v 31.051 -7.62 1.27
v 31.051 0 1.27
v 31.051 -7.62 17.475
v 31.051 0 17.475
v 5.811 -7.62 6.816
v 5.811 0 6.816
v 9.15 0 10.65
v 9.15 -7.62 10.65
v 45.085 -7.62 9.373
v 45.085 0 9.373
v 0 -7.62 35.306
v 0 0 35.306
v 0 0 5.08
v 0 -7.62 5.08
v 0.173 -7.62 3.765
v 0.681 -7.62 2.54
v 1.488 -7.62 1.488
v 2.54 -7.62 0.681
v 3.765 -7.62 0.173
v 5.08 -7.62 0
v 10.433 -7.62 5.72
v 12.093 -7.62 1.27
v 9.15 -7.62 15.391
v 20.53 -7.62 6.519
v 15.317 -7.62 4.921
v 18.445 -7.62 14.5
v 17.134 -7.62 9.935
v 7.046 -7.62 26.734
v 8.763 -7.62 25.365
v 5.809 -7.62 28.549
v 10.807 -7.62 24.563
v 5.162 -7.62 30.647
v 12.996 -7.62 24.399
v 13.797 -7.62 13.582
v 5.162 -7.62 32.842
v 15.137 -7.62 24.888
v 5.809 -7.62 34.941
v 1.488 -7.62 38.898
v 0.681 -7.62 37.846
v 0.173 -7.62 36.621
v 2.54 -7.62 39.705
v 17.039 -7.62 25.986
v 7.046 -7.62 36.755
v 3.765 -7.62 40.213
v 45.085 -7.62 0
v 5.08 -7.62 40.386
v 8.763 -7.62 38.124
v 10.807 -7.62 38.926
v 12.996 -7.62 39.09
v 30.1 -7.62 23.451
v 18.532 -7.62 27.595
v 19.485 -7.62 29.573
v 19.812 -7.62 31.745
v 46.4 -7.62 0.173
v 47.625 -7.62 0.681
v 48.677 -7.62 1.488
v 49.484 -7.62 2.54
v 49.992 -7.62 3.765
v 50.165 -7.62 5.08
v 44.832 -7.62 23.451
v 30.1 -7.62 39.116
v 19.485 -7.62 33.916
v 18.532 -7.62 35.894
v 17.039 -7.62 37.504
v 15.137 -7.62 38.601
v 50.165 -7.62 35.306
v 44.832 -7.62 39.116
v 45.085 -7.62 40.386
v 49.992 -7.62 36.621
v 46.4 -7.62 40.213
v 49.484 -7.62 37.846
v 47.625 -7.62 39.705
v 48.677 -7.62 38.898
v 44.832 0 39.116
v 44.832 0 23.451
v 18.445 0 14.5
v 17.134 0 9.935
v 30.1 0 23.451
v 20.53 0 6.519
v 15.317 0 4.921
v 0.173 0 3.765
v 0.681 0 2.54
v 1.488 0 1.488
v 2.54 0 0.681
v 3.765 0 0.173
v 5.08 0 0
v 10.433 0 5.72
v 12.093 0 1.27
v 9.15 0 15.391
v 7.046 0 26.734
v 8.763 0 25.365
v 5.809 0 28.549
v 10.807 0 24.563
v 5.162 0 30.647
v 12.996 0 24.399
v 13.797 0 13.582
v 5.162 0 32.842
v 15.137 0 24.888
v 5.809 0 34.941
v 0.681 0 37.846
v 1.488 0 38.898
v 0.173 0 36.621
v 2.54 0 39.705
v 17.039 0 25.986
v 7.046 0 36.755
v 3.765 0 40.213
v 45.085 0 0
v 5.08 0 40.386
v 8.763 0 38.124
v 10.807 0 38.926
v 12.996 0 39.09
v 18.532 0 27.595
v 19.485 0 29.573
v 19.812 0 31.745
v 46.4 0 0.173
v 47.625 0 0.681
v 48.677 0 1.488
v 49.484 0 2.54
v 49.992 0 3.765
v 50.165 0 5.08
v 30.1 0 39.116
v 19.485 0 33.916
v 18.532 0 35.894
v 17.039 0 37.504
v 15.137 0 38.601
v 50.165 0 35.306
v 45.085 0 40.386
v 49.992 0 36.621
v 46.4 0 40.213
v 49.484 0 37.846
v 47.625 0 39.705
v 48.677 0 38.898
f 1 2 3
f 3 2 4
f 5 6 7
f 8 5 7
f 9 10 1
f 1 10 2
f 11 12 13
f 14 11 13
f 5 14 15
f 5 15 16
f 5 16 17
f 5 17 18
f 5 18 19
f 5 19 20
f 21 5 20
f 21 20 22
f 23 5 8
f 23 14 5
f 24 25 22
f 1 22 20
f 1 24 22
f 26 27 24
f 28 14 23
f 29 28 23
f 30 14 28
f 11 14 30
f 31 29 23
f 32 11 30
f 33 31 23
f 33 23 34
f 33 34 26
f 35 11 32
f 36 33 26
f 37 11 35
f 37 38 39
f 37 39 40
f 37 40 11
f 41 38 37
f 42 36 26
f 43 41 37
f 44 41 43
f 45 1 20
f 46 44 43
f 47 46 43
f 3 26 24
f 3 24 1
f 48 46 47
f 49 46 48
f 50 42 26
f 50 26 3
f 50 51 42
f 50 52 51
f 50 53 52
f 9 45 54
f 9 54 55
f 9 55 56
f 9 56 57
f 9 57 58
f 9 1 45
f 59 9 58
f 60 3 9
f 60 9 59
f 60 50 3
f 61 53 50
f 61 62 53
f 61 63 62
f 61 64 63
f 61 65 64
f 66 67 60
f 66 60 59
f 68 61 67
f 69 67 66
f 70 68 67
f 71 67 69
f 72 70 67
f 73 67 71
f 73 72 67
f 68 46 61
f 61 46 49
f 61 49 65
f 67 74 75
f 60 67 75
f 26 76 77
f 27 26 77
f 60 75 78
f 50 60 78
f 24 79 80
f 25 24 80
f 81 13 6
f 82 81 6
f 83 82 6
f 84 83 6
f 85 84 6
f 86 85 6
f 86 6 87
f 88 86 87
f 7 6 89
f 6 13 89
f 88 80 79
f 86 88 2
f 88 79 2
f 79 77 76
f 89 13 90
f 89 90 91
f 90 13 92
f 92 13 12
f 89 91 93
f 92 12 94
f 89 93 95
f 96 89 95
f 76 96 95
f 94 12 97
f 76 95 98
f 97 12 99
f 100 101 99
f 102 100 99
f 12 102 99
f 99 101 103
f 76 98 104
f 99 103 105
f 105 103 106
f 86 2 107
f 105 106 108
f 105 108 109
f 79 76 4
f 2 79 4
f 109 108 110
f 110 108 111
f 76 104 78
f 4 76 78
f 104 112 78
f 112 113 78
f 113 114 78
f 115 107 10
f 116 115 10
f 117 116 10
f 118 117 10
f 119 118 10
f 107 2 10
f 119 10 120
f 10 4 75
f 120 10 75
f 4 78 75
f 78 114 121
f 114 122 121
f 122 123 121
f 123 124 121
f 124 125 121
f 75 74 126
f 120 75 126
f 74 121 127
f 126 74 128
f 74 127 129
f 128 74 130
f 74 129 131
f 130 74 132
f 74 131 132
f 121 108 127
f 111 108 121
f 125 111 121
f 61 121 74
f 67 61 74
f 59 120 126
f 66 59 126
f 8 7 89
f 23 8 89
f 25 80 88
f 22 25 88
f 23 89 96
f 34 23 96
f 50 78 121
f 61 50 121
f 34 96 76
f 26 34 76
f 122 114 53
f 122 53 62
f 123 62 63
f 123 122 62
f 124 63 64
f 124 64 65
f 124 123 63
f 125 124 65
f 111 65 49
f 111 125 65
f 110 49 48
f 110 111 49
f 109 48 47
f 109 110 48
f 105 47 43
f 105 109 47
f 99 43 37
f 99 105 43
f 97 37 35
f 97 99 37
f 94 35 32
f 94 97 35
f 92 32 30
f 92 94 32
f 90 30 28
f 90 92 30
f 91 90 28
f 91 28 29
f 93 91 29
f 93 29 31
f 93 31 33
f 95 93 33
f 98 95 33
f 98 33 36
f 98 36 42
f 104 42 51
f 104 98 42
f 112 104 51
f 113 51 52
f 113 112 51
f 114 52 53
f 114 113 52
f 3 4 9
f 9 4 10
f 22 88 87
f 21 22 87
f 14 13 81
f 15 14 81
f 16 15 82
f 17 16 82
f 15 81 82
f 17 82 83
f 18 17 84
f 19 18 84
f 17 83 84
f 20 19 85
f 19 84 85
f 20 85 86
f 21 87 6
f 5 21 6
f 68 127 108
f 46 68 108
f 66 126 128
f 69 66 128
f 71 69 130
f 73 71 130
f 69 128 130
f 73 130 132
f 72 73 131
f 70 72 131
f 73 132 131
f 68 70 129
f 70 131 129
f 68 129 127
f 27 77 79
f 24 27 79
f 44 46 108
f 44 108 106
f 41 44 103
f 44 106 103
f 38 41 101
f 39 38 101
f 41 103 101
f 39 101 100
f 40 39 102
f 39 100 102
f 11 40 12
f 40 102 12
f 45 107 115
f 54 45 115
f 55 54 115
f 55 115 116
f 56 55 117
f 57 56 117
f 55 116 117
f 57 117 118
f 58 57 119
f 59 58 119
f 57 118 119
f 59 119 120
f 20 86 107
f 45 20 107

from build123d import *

# Parameters (mm, degrees)
F0_R     = 7.366
F1_DEPTH = 7.62


with BuildPart() as f1:
    # F0 (on Front) → F1 (new body)
    with BuildSketch(Plane.XZ):
        with BuildLine():
            ThreePointArc((0, 5.08), (1.487898, 1.487898), (5.08, 0))
            Line((5.08, 0), (12.3952, 0))
            Line((12.3952, 0), (45.085, 0))
            ThreePointArc((45.085, 0), (48.677102, 1.487898), (50.165, 5.08))
            Line((50.165, 5.08), (50.165, 35.306))
            ThreePointArc((50.165, 35.306), (48.677102, 38.898102), (45.085, 40.386))
            Line((45.085, 40.386), (5.08, 40.386))
            ThreePointArc((5.08, 40.386), (1.487898, 38.898102), (0, 35.306))
            Line((0, 35.306), (0, 5.08))
        make_face()
        Polygon((15.317026, 4.921452), (12.092736, 1.27), (10.433039, 5.720394), (5.811439, 6.816485), (9.150001, 10.650024), (9.150001, 15.391108), (13.79747, 13.581598), (18.444939, 14.500056), (17.134047, 9.934734), (20.529886, 6.519335), align=None, mode=Mode.SUBTRACT)
        Polygon((45.085, 9.3726), (31.050885, 1.27), (31.050885, 17.4752), align=None, mode=Mode.SUBTRACT)
        with Locations((12.446, 31.744603)):
            Circle(F0_R, mode=Mode.SUBTRACT)
        Polygon((30.100089, 39.116), (44.832089, 39.116), (44.832089, 23.538094), (44.832089, 23.451079), (30.100089, 23.451079), align=None, mode=Mode.SUBTRACT)
    extrude(amount=F1_DEPTH)


solid = f1.part
